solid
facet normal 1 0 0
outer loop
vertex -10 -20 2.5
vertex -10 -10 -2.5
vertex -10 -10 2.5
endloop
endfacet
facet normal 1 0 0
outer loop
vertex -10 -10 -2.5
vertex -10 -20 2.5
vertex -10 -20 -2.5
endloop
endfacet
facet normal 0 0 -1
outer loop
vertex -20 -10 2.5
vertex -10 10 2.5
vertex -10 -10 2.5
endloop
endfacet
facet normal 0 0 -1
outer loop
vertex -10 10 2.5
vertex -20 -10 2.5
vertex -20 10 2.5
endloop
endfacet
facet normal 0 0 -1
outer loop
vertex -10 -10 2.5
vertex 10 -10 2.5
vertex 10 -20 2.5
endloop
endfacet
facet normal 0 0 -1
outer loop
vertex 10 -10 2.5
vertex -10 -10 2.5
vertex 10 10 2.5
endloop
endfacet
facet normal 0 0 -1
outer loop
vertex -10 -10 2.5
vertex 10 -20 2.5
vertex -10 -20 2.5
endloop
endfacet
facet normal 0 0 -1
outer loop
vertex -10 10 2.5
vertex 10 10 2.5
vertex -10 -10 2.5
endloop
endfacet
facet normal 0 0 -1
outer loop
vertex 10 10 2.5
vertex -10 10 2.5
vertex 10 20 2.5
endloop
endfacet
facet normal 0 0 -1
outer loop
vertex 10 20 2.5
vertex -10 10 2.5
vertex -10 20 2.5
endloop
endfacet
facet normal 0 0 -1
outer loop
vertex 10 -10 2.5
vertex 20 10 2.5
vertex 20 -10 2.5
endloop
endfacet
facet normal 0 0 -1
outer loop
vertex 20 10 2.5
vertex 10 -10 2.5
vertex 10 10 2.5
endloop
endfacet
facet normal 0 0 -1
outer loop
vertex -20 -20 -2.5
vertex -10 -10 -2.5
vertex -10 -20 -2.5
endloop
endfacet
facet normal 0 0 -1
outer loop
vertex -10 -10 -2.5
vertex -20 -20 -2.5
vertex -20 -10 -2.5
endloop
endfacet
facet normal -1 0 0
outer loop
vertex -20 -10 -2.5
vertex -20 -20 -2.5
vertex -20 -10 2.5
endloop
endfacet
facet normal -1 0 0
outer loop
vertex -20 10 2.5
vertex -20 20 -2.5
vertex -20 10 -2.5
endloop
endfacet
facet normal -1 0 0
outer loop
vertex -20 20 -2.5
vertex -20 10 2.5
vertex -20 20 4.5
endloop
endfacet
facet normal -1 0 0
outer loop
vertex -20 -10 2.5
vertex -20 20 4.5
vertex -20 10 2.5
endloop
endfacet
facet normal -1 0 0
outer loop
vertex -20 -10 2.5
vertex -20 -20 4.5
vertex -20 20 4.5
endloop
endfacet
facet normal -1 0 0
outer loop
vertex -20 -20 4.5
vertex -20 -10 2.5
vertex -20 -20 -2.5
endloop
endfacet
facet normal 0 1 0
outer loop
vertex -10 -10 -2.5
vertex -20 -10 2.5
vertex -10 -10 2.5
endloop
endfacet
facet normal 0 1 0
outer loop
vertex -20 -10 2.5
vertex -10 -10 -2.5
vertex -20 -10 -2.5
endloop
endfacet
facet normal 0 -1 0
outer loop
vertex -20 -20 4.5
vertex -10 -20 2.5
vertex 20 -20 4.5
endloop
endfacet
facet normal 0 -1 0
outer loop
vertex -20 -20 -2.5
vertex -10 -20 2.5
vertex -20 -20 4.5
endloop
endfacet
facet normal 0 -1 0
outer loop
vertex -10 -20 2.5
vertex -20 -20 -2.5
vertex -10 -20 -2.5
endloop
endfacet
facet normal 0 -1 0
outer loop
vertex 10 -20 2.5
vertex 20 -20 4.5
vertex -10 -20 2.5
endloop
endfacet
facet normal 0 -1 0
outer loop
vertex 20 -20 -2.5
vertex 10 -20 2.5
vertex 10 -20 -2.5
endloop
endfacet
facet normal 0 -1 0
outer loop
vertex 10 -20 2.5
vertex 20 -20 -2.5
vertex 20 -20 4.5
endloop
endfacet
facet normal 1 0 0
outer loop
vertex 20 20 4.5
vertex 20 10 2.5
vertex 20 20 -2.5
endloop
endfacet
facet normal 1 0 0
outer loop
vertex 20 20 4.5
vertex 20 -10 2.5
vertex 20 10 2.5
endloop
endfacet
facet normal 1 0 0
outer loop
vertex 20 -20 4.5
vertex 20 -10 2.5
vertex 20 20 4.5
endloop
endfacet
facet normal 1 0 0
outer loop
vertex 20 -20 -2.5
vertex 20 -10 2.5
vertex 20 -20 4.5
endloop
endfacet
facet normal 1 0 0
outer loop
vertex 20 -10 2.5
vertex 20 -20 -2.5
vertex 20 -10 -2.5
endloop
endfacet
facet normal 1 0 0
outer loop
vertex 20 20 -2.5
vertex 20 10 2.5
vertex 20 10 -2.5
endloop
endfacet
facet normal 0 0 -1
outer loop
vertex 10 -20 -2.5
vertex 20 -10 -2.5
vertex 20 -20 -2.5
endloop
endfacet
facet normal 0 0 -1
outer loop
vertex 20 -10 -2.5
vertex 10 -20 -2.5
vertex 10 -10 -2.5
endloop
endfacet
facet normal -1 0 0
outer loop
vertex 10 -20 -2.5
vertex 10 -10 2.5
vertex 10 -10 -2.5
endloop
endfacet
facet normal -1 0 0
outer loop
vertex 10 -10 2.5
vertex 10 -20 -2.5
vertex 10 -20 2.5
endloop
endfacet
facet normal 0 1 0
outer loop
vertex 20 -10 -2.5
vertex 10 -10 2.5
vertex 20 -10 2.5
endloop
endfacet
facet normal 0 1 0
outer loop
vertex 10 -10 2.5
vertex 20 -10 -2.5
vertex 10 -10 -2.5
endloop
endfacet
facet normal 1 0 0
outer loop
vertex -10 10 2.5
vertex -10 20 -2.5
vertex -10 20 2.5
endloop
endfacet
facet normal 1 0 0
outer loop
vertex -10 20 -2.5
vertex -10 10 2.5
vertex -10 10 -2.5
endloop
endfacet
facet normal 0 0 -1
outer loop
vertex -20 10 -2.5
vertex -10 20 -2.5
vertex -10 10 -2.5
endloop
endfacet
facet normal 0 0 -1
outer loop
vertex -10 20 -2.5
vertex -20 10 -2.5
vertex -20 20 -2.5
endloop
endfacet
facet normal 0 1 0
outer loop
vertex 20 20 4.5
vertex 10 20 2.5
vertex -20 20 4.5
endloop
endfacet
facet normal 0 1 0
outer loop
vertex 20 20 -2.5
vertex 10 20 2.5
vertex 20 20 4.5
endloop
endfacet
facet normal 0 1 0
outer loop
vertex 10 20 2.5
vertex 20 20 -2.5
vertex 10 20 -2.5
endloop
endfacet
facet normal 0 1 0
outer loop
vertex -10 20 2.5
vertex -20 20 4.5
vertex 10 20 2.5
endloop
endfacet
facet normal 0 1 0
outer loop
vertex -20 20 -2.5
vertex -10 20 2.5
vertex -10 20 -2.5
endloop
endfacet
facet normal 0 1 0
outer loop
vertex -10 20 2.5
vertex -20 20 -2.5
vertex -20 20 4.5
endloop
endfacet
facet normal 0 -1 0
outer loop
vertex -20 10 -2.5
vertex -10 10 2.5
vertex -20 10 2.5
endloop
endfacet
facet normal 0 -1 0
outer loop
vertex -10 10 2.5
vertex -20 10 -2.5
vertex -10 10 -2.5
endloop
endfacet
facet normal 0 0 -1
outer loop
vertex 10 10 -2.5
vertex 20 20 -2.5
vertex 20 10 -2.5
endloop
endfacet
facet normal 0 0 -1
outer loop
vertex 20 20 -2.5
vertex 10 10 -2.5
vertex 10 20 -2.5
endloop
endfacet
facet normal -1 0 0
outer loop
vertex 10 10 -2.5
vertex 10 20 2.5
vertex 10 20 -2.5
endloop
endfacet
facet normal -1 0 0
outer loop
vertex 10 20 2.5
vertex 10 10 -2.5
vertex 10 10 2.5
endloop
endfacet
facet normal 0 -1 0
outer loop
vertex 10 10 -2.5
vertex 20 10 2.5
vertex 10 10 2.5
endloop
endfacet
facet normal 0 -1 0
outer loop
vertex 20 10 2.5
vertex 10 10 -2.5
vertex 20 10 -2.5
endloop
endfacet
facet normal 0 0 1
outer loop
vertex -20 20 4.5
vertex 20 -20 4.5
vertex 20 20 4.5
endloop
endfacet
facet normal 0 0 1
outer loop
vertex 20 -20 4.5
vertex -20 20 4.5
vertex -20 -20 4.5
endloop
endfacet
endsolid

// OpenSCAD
delta=20;
width=10;
height=[5, 2];

for (j = [-1:2:1])
{
	for (i = [-1:2:1])
	{
		translate([i*delta/2+i*width/2,j*delta/2+j*width/2,0])
			cube([width,width,height[0]], center=true);
	}
}

translate([0,0,height[0]/2+height[1]/2])
	cube([delta+2*width,delta+2*width,height[1]], center=true);
